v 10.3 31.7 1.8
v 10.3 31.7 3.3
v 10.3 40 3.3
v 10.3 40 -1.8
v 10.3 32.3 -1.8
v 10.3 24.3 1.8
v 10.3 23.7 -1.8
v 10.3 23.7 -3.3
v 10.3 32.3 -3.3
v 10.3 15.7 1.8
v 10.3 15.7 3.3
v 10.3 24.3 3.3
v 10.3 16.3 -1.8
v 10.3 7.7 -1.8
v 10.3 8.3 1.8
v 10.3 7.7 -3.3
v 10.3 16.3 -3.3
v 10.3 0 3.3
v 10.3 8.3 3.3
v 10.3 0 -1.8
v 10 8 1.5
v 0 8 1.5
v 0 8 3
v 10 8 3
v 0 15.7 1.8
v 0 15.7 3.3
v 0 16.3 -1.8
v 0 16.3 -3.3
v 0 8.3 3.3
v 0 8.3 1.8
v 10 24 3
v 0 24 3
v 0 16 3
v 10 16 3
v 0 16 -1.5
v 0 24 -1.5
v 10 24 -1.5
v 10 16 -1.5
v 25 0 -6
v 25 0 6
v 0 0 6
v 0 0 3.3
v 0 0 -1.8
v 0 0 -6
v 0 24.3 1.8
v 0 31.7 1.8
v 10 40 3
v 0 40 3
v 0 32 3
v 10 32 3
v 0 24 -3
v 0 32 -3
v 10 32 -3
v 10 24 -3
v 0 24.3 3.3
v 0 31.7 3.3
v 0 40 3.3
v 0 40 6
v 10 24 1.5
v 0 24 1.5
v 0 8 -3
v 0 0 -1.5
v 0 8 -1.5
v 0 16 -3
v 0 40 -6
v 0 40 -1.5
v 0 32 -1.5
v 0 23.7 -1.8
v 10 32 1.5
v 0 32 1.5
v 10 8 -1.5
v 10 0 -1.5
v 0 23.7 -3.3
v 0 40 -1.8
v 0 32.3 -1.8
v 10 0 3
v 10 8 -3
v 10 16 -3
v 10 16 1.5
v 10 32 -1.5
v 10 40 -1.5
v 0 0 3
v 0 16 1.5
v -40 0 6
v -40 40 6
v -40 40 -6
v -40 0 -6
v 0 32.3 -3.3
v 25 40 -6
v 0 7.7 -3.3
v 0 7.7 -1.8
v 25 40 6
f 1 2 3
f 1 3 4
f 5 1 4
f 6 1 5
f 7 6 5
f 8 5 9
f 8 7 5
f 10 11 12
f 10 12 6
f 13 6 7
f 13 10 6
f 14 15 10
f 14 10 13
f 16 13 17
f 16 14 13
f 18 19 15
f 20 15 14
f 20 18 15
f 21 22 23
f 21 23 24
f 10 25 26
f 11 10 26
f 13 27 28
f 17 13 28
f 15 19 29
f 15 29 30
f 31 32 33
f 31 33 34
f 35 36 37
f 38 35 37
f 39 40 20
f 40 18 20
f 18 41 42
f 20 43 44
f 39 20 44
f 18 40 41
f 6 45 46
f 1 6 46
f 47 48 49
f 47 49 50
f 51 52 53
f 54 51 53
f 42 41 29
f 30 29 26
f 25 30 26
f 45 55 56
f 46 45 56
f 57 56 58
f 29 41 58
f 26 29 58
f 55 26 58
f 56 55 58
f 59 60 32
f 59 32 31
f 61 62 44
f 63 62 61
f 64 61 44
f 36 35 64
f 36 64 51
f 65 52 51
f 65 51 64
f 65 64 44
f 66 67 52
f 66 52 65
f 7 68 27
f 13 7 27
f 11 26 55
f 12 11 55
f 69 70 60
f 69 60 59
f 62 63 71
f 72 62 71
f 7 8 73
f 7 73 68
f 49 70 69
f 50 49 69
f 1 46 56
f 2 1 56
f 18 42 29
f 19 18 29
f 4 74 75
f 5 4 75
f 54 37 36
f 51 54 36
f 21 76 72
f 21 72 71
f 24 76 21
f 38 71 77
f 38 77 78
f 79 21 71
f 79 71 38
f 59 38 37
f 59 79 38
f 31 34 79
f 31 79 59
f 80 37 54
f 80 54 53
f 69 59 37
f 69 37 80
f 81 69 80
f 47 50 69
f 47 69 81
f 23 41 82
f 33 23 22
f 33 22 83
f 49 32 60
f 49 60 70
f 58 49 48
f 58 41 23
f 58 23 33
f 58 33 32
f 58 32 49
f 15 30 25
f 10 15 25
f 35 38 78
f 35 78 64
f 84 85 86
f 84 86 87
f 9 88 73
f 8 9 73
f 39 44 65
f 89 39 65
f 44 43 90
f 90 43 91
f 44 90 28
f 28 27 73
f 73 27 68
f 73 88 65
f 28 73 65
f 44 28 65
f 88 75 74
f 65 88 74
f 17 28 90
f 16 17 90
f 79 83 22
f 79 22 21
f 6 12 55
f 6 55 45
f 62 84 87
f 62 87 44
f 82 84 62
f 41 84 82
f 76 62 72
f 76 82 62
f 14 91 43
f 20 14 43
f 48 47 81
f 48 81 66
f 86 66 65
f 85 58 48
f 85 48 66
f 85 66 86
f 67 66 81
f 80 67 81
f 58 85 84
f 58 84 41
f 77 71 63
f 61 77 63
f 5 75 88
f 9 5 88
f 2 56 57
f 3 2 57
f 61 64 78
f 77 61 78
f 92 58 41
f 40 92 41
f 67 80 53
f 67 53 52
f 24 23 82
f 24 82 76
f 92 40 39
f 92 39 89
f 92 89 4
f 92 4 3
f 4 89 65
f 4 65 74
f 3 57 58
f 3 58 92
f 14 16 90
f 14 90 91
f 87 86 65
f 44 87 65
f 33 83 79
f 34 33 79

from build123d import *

# Parameters (mm, degrees)
F1_DEPTH = 6
F0_W     = 10
F0_H     = 8
F2_DEPTH = 1.5
F3_DEPTH = 3
F4_DEPTH = 4.5
F6_DEPTH = 25
F7_W     = 14.7
F7_H     = 7.8
F7_H_2   = 4.2
F8_DEPTH = 40


with BuildPart() as f1:
    # F0 (on Top) → F1 (new body, symmetric)
    with BuildSketch(Plane.XY):
        Polygon((0, 40), (-40, 40), (-40, 0), (0, 0), (0, 8), (0, 16), (0, 24), (0, 32), align=None)
    extrude(amount=F1_DEPTH, both=True)

    # F0 (on Top) → F2 (join, symmetric)
    with BuildSketch(Plane.XY):
        with Locations((5, 4)):
            Rectangle(F0_W, F0_H)
        with Locations((5, 20)):
            Rectangle(F0_W, F0_H)
        with Locations((5, 12)):
            Rectangle(F0_W, F0_H)
        with Locations((5, 28)):
            Rectangle(F0_W, F0_H)
        with Locations((5, 36)):
            Rectangle(F0_W, F0_H)
    extrude(amount=F2_DEPTH, both=True)

    # F0 (on Top) → F3 (join)
    with BuildSketch(Plane.XY):
        with Locations((5, 4)):
            Rectangle(F0_W, F0_H)
        with Locations((5, 20)):
            Rectangle(F0_W, F0_H)
        with Locations((5, 36)):
            Rectangle(F0_W, F0_H)
    extrude(amount=F3_DEPTH)

    # F4 (add): faces of the model
    f4_faces = [f1.faces().sort_by_distance(p)[0] for p in [
        (5, 12, 1.5),
        (5, 28, 1.5),
    ]]
    extrude(f4_faces, amount=-F4_DEPTH)


with BuildPart() as f6:
    # F5 (on face) → F6 (new body)
    with BuildSketch(Plane.YZ):
        Polygon((31.7, 3.3), (40, 3.3), (40, 6), (0, 6), (0, 3.3), (8.3, 3.3), (8.3, 1.8), (15.7, 1.8), (15.7, 3.3), (24.3, 3.3), (24.3, 1.8), (31.7, 1.8), align=None)
    extrude(amount=F6_DEPTH)



with BuildPart() as f6b:
    # F5 (on face) → F6, piece 2 (new body)
    with BuildSketch(Plane.YZ):
        Polygon((40, -6), (40, -1.8), (32.3, -1.8), (32.3, -3.3), (23.7, -3.3), (23.7, -1.8), (16.3, -1.8), (16.3, -3.3), (7.7, -3.3), (7.7, -1.8), (0, -1.8), (0, -6), align=None)
    extrude(amount=F6_DEPTH)


with BuildPart() as f6_1:
    add(f6.part)

    add(f6b.part)  # F8 merges F6b
    # F7 (on face) → F8 (join, through all)
    with BuildSketch(Plane.XZ):
        with Locations((17.65, 2.1)):
            Rectangle(F7_W, F7_H)
        with Locations((17.65, -3.9)):
            Rectangle(F7_W, F7_H_2)
    extrude(amount=-F8_DEPTH)


solid = Compound([f1.part, f6_1.part])
